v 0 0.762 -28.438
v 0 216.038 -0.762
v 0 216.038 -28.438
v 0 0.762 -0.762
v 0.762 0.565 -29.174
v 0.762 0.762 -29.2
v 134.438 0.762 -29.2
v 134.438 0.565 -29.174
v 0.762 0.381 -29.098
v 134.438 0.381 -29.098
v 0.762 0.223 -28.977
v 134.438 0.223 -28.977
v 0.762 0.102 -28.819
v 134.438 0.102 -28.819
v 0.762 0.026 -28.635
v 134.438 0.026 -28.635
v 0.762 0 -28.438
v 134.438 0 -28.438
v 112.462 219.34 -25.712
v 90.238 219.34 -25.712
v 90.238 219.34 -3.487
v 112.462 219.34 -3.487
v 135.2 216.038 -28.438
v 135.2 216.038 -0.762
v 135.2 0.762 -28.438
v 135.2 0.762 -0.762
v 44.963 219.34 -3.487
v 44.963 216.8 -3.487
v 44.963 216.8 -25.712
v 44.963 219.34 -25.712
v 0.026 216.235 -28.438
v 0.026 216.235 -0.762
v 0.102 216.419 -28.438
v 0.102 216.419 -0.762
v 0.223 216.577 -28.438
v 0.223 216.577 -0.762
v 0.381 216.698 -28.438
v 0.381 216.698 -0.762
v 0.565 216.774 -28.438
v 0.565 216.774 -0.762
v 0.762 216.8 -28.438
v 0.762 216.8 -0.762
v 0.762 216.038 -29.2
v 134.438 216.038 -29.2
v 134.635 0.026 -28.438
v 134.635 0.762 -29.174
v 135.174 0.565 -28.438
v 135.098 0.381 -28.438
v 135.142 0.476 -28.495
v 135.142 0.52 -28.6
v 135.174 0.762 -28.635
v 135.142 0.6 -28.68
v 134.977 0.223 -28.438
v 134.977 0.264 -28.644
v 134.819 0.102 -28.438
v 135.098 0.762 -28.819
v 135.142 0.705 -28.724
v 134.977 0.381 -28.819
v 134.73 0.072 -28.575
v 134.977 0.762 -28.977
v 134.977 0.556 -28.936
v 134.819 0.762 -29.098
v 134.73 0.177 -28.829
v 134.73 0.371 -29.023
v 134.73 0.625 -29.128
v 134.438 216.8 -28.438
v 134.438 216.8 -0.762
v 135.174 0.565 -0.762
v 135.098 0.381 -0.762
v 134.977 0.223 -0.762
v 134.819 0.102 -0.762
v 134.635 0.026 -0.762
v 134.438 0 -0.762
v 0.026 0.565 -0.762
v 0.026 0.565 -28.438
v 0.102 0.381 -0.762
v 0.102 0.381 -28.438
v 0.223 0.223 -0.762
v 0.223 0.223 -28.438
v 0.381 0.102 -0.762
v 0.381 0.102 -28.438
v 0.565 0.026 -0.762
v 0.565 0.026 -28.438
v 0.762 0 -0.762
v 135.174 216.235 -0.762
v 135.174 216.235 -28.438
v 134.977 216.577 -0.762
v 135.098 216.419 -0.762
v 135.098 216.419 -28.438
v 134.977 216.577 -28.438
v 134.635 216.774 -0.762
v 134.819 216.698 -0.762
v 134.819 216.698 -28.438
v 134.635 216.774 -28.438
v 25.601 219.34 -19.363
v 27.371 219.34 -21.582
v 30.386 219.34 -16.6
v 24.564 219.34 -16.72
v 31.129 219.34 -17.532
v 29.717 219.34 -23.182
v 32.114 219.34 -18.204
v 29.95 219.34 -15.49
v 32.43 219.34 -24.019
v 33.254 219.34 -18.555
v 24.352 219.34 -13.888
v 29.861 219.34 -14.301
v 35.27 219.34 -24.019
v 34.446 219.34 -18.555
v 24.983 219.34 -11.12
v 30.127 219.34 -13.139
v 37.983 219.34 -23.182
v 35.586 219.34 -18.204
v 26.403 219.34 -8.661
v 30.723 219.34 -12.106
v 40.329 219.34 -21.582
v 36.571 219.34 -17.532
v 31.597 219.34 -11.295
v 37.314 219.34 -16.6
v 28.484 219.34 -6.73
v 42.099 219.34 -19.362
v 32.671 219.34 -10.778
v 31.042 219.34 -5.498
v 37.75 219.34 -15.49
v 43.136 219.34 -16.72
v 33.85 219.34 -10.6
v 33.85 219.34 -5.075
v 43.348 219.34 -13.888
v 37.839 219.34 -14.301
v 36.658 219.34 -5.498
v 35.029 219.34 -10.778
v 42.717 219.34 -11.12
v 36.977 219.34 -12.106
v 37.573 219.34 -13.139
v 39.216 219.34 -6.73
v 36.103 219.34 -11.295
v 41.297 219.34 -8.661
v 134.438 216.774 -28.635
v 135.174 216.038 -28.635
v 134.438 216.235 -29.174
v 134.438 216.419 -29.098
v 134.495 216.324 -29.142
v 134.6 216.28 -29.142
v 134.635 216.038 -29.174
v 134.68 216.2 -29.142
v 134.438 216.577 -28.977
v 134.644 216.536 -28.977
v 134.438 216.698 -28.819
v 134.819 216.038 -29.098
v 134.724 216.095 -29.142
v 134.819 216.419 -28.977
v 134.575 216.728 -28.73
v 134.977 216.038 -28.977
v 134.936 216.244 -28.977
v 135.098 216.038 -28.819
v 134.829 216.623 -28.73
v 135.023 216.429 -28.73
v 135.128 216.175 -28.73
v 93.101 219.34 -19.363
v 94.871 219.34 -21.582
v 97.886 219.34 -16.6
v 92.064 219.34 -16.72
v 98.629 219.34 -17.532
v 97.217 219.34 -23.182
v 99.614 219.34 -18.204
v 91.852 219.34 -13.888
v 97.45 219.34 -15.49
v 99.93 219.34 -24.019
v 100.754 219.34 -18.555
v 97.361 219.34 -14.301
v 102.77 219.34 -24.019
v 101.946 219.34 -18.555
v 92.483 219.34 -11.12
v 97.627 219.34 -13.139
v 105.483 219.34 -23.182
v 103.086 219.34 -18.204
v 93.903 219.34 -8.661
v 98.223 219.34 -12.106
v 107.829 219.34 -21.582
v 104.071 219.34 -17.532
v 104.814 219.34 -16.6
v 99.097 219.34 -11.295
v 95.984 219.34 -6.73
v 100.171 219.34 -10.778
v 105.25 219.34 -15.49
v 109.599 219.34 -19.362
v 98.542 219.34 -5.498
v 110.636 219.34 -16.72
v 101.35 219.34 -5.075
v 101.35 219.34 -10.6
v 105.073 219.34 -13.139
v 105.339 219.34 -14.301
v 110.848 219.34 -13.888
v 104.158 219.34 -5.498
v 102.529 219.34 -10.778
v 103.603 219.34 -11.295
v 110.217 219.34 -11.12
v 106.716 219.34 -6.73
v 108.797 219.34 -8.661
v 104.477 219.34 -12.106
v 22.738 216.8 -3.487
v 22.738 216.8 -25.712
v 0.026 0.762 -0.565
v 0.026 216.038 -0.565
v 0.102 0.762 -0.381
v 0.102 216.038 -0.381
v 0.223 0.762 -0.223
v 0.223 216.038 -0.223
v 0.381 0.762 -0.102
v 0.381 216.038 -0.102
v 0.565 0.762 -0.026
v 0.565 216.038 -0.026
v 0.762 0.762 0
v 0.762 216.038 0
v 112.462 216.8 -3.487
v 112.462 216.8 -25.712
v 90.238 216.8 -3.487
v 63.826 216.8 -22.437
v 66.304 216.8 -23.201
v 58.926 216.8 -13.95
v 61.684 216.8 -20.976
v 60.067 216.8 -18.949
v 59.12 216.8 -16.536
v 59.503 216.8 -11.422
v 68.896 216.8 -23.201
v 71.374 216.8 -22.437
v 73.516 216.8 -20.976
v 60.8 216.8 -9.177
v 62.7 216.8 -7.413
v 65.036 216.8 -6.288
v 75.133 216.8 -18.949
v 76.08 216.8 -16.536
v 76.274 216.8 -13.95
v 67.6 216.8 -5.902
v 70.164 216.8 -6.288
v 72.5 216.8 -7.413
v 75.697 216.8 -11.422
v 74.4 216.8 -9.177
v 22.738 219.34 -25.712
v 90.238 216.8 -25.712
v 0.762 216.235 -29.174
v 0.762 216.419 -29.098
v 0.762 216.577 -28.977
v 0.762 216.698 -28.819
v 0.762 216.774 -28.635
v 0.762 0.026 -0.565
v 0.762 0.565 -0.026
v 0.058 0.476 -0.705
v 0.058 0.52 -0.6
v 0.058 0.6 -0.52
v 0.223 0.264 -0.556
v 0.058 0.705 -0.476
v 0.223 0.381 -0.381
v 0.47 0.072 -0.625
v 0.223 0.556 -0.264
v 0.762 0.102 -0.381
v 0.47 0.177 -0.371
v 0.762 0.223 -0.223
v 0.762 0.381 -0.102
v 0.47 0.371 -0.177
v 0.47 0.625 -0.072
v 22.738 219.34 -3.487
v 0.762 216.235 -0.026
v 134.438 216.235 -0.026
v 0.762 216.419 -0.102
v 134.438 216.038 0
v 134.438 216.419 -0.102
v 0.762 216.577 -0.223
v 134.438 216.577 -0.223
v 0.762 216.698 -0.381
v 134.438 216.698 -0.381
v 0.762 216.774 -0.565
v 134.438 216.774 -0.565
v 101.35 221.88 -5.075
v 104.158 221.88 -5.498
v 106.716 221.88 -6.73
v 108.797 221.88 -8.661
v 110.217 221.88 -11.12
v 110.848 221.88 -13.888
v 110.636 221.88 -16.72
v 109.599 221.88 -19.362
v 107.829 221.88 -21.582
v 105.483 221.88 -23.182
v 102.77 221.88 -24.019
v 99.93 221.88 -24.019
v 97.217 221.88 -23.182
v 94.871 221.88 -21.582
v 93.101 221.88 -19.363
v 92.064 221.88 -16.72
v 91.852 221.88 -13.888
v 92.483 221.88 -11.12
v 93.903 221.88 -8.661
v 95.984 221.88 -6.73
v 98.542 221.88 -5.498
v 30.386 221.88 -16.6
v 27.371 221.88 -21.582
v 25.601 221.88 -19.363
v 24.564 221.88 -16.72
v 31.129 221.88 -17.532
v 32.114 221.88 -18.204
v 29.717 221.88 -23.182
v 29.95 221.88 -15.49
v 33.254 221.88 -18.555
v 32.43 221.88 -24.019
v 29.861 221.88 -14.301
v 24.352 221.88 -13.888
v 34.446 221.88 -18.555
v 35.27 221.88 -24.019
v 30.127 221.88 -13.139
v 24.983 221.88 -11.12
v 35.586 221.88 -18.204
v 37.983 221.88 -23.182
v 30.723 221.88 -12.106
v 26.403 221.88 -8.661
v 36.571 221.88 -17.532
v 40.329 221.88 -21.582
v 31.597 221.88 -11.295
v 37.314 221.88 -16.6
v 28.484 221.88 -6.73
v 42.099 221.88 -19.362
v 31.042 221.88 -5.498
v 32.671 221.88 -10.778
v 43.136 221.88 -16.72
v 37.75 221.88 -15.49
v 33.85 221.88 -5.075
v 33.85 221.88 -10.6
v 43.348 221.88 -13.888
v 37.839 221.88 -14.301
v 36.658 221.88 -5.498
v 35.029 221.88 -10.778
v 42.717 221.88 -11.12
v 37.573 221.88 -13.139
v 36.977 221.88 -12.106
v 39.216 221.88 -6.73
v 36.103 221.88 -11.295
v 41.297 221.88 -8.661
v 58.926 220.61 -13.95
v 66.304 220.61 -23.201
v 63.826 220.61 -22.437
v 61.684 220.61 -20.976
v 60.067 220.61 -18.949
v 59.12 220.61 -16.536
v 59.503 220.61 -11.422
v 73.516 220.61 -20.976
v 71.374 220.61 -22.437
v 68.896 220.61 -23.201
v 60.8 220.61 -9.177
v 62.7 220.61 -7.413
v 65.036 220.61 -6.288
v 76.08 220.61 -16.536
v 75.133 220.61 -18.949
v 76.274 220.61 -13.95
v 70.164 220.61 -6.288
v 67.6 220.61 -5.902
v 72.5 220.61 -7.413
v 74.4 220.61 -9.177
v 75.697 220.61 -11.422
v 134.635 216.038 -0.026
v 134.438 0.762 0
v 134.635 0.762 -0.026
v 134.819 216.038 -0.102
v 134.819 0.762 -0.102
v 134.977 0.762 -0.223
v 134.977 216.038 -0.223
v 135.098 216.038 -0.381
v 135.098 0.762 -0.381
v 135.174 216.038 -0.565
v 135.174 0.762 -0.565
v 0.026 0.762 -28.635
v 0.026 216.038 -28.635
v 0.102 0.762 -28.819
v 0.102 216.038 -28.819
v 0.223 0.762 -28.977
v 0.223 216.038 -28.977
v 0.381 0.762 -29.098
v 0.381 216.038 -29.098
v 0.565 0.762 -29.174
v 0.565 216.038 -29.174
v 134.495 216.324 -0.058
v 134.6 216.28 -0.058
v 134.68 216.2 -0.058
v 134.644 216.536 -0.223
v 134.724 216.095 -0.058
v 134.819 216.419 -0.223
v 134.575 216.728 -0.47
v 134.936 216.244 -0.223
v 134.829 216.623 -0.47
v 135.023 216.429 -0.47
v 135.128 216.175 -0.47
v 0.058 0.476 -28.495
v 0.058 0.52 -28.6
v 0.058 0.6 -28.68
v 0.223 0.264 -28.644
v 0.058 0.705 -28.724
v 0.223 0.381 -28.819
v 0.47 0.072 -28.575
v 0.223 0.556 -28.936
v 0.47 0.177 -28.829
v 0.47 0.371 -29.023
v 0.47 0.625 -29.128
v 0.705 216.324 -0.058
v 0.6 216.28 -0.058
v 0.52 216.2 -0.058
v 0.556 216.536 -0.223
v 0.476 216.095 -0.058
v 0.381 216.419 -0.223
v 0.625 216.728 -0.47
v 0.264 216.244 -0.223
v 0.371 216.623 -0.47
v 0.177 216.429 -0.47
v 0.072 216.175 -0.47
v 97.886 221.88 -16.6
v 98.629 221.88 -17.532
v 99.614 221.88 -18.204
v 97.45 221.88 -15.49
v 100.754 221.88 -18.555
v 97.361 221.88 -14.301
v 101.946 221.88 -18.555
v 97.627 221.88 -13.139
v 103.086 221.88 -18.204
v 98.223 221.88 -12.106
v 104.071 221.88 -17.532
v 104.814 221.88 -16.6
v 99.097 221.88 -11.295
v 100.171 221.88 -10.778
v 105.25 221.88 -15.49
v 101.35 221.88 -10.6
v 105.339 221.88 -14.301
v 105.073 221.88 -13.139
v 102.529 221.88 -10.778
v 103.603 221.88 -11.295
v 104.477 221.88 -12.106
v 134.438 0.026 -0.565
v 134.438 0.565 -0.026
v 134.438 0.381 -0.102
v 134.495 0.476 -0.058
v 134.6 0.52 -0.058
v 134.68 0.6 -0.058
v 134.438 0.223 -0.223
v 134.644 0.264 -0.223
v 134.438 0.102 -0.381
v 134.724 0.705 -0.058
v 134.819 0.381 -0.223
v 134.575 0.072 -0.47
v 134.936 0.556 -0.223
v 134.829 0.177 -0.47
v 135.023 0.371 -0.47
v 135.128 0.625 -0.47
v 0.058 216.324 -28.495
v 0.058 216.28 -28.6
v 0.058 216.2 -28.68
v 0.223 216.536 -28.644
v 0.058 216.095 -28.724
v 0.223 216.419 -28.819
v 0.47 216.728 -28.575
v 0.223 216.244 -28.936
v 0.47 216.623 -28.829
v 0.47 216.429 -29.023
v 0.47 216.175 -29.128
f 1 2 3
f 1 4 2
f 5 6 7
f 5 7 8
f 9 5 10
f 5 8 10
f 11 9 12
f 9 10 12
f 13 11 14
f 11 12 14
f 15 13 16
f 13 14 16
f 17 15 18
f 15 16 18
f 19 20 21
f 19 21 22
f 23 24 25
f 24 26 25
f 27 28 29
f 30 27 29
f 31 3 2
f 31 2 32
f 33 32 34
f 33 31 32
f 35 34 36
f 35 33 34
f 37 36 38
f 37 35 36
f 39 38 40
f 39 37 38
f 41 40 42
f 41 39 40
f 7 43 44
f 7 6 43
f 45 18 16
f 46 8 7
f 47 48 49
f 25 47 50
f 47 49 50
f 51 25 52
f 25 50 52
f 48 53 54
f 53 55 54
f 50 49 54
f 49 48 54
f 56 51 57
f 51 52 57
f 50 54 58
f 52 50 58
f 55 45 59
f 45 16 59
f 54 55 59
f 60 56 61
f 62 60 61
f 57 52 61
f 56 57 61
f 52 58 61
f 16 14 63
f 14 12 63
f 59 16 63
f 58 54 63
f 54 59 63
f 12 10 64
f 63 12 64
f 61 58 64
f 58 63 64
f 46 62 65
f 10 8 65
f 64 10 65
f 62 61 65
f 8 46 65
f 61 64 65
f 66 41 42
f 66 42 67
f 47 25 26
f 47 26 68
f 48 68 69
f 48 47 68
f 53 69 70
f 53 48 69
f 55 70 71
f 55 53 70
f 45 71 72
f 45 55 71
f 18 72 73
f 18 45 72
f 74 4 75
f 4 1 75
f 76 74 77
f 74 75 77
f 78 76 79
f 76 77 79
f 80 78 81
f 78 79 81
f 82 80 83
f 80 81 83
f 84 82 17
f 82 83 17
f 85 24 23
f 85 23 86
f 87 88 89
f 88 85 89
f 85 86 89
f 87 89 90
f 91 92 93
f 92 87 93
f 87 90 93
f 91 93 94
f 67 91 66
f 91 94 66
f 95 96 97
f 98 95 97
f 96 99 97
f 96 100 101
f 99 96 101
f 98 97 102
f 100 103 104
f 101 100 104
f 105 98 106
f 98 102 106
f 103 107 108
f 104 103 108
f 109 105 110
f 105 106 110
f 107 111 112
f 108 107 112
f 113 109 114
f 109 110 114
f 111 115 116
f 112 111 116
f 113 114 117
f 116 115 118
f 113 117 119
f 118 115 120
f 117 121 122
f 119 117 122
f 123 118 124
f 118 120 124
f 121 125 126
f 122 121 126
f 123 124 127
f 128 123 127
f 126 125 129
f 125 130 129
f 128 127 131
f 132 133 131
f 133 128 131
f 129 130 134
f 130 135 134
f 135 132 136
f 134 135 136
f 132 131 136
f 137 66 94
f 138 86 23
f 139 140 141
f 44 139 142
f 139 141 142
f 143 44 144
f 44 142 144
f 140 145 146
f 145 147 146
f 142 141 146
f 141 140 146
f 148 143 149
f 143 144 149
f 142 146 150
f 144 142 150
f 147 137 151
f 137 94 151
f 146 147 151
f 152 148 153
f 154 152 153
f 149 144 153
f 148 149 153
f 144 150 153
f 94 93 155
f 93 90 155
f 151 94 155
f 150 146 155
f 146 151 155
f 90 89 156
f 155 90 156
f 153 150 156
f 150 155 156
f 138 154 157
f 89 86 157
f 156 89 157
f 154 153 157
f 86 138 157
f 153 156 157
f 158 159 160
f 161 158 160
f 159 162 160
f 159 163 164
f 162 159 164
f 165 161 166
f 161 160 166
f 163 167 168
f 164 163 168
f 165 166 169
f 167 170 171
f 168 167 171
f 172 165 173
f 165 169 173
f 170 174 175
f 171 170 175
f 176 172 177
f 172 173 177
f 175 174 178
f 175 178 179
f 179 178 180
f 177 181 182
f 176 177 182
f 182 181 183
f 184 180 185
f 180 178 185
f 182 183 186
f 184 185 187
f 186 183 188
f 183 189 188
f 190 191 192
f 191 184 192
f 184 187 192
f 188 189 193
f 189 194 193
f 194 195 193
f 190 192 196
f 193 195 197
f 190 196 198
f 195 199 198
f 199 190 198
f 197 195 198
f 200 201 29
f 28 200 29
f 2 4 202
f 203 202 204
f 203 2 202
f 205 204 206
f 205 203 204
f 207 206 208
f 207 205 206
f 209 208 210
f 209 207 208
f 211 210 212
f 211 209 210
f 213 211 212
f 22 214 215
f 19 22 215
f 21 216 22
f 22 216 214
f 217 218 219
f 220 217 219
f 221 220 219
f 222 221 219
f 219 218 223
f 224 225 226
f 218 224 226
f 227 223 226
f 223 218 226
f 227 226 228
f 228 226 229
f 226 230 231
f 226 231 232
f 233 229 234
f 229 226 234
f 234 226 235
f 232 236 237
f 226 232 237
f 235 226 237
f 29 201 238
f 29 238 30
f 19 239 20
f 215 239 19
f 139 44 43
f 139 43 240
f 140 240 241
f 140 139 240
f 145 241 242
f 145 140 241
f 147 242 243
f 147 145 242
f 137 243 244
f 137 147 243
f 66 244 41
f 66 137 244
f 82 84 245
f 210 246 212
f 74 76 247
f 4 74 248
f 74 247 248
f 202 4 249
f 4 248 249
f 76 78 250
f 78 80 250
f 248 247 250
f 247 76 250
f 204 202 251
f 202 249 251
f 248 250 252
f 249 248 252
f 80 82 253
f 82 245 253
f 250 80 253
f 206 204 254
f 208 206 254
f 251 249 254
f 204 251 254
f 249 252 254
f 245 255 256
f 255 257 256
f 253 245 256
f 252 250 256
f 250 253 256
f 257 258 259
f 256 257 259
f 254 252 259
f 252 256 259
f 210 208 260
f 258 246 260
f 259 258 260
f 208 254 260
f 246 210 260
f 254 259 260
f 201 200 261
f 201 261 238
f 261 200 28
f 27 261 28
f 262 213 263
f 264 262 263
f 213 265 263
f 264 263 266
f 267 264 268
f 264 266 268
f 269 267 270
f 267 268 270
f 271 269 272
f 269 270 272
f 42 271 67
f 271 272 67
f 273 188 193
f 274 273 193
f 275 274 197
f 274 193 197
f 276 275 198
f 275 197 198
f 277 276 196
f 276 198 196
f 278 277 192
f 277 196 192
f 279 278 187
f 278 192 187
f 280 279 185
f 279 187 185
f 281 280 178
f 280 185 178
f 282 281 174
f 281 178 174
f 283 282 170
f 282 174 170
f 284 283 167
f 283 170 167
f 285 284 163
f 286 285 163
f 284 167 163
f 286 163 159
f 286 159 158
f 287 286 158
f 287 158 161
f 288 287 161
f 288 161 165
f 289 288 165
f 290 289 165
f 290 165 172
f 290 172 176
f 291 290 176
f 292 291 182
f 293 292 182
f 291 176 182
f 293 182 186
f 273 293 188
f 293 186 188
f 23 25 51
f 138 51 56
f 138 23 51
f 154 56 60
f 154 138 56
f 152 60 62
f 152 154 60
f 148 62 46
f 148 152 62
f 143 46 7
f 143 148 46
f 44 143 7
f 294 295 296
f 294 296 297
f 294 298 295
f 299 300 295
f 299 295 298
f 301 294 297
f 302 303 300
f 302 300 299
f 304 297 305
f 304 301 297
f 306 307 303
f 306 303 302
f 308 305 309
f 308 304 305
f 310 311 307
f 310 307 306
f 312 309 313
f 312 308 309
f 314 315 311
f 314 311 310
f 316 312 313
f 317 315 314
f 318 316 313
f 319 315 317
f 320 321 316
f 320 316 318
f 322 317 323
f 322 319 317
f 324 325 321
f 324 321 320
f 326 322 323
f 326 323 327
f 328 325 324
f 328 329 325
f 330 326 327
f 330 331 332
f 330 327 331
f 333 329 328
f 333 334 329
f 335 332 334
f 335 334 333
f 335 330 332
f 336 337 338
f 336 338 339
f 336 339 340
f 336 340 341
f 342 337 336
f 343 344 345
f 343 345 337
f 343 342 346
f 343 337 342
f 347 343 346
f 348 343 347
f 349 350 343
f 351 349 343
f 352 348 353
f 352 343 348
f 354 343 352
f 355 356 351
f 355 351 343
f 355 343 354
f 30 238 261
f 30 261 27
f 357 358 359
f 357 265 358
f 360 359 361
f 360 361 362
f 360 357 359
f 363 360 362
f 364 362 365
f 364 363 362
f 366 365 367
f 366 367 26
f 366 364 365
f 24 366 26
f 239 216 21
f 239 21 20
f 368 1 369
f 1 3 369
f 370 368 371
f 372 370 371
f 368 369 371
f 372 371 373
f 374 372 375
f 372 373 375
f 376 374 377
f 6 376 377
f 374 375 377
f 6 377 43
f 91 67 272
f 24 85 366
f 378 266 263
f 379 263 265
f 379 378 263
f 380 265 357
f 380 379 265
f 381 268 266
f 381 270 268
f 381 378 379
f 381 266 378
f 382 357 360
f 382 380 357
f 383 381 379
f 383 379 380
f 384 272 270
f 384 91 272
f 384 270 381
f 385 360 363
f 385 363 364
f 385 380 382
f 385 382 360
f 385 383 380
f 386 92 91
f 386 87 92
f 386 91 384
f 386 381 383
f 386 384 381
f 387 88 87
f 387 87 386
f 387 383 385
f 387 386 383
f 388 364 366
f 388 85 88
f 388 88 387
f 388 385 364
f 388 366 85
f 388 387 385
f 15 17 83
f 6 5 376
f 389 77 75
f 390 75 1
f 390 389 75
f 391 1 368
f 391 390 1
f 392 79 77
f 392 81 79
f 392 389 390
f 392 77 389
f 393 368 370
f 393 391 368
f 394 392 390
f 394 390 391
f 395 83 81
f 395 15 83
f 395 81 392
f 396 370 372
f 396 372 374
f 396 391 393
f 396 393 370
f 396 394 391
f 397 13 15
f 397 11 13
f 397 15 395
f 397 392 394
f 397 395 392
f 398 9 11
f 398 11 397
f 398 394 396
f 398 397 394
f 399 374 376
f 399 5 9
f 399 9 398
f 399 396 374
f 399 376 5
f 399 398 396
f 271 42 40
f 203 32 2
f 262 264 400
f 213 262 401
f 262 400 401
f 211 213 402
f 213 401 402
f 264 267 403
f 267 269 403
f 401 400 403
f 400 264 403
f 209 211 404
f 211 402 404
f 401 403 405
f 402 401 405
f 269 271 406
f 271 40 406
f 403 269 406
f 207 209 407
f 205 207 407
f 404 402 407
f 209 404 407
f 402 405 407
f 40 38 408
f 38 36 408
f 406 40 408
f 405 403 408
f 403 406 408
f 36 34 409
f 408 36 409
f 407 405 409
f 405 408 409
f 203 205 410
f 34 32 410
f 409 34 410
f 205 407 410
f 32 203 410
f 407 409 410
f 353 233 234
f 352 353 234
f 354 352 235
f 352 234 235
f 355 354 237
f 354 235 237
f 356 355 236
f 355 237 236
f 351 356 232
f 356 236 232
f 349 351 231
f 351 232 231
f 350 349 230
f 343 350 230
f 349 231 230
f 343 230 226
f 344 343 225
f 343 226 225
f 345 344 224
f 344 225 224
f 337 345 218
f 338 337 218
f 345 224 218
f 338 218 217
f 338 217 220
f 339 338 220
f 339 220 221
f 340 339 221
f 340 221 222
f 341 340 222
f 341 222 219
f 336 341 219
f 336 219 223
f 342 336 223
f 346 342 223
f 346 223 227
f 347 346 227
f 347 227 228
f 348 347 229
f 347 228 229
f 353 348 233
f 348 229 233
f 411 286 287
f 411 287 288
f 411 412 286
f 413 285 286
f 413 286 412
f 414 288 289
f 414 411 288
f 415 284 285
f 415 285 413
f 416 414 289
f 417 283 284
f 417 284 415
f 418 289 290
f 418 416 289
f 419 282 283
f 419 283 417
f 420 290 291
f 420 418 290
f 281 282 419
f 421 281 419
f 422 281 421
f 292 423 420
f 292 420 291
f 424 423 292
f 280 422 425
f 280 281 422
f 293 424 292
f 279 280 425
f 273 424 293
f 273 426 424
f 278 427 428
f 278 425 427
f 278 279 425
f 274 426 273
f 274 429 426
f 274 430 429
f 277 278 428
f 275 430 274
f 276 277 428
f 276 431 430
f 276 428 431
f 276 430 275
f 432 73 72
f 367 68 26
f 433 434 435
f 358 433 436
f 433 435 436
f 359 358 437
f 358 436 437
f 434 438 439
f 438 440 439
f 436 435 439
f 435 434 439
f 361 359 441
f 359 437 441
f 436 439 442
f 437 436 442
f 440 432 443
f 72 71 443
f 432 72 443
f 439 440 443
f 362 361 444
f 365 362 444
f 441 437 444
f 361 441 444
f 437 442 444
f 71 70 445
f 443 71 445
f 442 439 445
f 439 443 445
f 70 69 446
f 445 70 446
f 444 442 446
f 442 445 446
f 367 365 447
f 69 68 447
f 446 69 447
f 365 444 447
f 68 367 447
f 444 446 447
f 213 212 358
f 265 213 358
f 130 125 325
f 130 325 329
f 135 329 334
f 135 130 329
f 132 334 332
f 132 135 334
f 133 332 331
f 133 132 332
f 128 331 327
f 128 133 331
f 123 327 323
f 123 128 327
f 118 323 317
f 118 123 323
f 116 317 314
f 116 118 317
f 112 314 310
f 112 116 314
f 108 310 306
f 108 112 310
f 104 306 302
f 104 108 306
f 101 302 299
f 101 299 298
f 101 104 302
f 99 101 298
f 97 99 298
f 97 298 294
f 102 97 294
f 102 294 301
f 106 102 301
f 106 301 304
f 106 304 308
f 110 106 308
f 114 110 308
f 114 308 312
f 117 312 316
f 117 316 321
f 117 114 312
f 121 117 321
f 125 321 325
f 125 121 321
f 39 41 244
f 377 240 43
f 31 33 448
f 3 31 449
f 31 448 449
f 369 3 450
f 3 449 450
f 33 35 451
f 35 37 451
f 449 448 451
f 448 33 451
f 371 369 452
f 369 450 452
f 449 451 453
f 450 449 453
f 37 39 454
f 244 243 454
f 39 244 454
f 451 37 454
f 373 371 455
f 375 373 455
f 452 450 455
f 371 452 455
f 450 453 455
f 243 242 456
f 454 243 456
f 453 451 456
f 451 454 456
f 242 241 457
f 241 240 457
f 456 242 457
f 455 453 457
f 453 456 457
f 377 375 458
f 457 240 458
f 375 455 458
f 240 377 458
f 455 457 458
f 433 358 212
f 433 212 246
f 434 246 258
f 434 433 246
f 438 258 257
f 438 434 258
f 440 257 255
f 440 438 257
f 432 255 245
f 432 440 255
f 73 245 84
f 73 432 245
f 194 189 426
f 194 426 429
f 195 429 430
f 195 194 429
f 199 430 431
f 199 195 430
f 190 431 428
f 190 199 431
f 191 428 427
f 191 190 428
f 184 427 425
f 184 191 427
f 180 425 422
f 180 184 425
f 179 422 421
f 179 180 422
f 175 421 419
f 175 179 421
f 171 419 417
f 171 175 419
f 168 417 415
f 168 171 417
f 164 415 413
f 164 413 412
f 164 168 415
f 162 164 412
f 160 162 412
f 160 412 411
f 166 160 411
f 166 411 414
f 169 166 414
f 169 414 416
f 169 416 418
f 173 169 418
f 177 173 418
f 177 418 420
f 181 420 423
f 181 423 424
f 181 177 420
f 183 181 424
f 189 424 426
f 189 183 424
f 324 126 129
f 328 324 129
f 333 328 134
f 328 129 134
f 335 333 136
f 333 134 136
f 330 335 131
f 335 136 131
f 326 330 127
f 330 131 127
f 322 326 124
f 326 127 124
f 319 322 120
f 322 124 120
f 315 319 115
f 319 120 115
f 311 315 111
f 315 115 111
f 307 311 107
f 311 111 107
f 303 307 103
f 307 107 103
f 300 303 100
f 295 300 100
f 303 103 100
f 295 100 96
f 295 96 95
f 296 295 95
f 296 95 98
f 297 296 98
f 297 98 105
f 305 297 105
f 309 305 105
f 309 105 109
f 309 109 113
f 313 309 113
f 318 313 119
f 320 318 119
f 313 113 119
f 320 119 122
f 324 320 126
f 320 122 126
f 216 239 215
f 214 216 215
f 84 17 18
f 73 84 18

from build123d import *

# Parameters (mm, degrees)
SKETCH1_W             = 135.2
SKETCH1_H             = 29.2
BOSS_EXTRUDE1_DEPTH   = 216.8
SKETCH2_W             = 22.225
SKETCH2_H             = 22.225
BOSS_EXTRUDE2_DEPTH   = 2.54
BOSS_EXTRUDE2_2_DEPTH = 2.54
SKETCH4_R             = 9.525
SKETCH4_R_2           = 4
BOSS_EXTRUDE3_DEPTH   = 2.54
BOSS_EXTRUDE3_2_DEPTH = 2.54
SKETCH5_R             = 8.69809988
BOSS_EXTRUDE4_DEPTH   = 3.81
FILLET1_R             = 0.762


with BuildPart() as part:
    # Sketch1 → Boss-Extrude1 (new body)
    with BuildSketch(Plane(origin=(0, 0, 0), x_dir=(1, 0, 0), z_dir=(0, 1, 0))):
        with Locations((67.6, 14.6)):
            Rectangle(SKETCH1_W, SKETCH1_H)
    extrude(amount=BOSS_EXTRUDE1_DEPTH)

    # Fillet1
    fillet1_edges = [part.edges().sort_by_distance(p)[0] for p in [
        (135.2, 216.8, -14.6),
        (67.6, 216.8, -29.2),
        (0, 216.8, -14.6),
        (67.6, 0, -29.2),
        (135.2, 0, -14.6),
        (67.6, 0, 0),
        (0, 0, -14.6),
        (67.6, 216.8, 0),
        (0, 108.4, -29.2),
        (135.2, 108.4, -29.2),
        (135.2, 108.4, 0),
        (0, 108.4, 0),
    ]]
    fillet(fillet1_edges, radius=FILLET1_R)


with BuildPart() as body_2:
    # Sketch2 → Boss-Extrude2 (new body)
    with BuildSketch(Plane(origin=(0, 216.8, 0), x_dir=(1, 0, 0), z_dir=(0, 1, 0))):
        with Locations((33.85, 14.6)):
            Rectangle(SKETCH2_W, SKETCH2_H)
    extrude(amount=BOSS_EXTRUDE2_DEPTH)


with BuildPart() as body_3:
    # Sketch2 → Boss-Extrude2 2 (new body)
    with BuildSketch(Plane(origin=(0, 216.8, 0), x_dir=(1, 0, 0), z_dir=(0, 1, 0))):
        with Locations((101.35, 14.6)):
            Rectangle(SKETCH2_W, SKETCH2_H)
    extrude(amount=BOSS_EXTRUDE2_2_DEPTH)


with BuildPart() as body_4:
    # Sketch4 → Boss-Extrude3 (new body)
    with BuildSketch(Plane(origin=(0, 219.34, 0), x_dir=(1, 0, 0), z_dir=(0, 1, 0))):
        with Locations(Location((33.85, 14.6, 0), (0, 0, 270))):  # turned: the seam where the file's is
            Circle(SKETCH4_R)
        with Locations(Location((33.85, 14.6, 0), (0, 0, 270))):  # turned: the seam where the file's is
            Circle(SKETCH4_R_2, mode=Mode.SUBTRACT)
    extrude(amount=BOSS_EXTRUDE3_DEPTH)


with BuildPart() as body_5:
    # Sketch4 → Boss-Extrude3 2 (new body)
    with BuildSketch(Plane(origin=(0, 219.34, 0), x_dir=(1, 0, 0), z_dir=(0, 1, 0))):
        with Locations(Location((101.35, 14.6, 0), (0, 0, 270))):  # turned: the seam where the file's is
            Circle(SKETCH4_R)
        with Locations(Location((101.35, 14.6, 0), (0, 0, 270))):  # turned: the seam where the file's is
            Circle(SKETCH4_R_2, mode=Mode.SUBTRACT)
    extrude(amount=BOSS_EXTRUDE3_2_DEPTH)


with BuildPart() as body_6:
    # Sketch5 → Boss-Extrude4 (new body)
    with BuildSketch(Plane(origin=(0, 216.8, 0), x_dir=(1, 0, 0), z_dir=(0, 1, 0))):
        with Locations(Location((67.6, 14.6, 0), (0, 0, 270))):  # turned: the seam where the file's is
            Circle(SKETCH5_R)
    extrude(amount=BOSS_EXTRUDE4_DEPTH)


solid = Compound([part.part, body_2.part, body_3.part, body_4.part, body_5.part, body_6.part])
